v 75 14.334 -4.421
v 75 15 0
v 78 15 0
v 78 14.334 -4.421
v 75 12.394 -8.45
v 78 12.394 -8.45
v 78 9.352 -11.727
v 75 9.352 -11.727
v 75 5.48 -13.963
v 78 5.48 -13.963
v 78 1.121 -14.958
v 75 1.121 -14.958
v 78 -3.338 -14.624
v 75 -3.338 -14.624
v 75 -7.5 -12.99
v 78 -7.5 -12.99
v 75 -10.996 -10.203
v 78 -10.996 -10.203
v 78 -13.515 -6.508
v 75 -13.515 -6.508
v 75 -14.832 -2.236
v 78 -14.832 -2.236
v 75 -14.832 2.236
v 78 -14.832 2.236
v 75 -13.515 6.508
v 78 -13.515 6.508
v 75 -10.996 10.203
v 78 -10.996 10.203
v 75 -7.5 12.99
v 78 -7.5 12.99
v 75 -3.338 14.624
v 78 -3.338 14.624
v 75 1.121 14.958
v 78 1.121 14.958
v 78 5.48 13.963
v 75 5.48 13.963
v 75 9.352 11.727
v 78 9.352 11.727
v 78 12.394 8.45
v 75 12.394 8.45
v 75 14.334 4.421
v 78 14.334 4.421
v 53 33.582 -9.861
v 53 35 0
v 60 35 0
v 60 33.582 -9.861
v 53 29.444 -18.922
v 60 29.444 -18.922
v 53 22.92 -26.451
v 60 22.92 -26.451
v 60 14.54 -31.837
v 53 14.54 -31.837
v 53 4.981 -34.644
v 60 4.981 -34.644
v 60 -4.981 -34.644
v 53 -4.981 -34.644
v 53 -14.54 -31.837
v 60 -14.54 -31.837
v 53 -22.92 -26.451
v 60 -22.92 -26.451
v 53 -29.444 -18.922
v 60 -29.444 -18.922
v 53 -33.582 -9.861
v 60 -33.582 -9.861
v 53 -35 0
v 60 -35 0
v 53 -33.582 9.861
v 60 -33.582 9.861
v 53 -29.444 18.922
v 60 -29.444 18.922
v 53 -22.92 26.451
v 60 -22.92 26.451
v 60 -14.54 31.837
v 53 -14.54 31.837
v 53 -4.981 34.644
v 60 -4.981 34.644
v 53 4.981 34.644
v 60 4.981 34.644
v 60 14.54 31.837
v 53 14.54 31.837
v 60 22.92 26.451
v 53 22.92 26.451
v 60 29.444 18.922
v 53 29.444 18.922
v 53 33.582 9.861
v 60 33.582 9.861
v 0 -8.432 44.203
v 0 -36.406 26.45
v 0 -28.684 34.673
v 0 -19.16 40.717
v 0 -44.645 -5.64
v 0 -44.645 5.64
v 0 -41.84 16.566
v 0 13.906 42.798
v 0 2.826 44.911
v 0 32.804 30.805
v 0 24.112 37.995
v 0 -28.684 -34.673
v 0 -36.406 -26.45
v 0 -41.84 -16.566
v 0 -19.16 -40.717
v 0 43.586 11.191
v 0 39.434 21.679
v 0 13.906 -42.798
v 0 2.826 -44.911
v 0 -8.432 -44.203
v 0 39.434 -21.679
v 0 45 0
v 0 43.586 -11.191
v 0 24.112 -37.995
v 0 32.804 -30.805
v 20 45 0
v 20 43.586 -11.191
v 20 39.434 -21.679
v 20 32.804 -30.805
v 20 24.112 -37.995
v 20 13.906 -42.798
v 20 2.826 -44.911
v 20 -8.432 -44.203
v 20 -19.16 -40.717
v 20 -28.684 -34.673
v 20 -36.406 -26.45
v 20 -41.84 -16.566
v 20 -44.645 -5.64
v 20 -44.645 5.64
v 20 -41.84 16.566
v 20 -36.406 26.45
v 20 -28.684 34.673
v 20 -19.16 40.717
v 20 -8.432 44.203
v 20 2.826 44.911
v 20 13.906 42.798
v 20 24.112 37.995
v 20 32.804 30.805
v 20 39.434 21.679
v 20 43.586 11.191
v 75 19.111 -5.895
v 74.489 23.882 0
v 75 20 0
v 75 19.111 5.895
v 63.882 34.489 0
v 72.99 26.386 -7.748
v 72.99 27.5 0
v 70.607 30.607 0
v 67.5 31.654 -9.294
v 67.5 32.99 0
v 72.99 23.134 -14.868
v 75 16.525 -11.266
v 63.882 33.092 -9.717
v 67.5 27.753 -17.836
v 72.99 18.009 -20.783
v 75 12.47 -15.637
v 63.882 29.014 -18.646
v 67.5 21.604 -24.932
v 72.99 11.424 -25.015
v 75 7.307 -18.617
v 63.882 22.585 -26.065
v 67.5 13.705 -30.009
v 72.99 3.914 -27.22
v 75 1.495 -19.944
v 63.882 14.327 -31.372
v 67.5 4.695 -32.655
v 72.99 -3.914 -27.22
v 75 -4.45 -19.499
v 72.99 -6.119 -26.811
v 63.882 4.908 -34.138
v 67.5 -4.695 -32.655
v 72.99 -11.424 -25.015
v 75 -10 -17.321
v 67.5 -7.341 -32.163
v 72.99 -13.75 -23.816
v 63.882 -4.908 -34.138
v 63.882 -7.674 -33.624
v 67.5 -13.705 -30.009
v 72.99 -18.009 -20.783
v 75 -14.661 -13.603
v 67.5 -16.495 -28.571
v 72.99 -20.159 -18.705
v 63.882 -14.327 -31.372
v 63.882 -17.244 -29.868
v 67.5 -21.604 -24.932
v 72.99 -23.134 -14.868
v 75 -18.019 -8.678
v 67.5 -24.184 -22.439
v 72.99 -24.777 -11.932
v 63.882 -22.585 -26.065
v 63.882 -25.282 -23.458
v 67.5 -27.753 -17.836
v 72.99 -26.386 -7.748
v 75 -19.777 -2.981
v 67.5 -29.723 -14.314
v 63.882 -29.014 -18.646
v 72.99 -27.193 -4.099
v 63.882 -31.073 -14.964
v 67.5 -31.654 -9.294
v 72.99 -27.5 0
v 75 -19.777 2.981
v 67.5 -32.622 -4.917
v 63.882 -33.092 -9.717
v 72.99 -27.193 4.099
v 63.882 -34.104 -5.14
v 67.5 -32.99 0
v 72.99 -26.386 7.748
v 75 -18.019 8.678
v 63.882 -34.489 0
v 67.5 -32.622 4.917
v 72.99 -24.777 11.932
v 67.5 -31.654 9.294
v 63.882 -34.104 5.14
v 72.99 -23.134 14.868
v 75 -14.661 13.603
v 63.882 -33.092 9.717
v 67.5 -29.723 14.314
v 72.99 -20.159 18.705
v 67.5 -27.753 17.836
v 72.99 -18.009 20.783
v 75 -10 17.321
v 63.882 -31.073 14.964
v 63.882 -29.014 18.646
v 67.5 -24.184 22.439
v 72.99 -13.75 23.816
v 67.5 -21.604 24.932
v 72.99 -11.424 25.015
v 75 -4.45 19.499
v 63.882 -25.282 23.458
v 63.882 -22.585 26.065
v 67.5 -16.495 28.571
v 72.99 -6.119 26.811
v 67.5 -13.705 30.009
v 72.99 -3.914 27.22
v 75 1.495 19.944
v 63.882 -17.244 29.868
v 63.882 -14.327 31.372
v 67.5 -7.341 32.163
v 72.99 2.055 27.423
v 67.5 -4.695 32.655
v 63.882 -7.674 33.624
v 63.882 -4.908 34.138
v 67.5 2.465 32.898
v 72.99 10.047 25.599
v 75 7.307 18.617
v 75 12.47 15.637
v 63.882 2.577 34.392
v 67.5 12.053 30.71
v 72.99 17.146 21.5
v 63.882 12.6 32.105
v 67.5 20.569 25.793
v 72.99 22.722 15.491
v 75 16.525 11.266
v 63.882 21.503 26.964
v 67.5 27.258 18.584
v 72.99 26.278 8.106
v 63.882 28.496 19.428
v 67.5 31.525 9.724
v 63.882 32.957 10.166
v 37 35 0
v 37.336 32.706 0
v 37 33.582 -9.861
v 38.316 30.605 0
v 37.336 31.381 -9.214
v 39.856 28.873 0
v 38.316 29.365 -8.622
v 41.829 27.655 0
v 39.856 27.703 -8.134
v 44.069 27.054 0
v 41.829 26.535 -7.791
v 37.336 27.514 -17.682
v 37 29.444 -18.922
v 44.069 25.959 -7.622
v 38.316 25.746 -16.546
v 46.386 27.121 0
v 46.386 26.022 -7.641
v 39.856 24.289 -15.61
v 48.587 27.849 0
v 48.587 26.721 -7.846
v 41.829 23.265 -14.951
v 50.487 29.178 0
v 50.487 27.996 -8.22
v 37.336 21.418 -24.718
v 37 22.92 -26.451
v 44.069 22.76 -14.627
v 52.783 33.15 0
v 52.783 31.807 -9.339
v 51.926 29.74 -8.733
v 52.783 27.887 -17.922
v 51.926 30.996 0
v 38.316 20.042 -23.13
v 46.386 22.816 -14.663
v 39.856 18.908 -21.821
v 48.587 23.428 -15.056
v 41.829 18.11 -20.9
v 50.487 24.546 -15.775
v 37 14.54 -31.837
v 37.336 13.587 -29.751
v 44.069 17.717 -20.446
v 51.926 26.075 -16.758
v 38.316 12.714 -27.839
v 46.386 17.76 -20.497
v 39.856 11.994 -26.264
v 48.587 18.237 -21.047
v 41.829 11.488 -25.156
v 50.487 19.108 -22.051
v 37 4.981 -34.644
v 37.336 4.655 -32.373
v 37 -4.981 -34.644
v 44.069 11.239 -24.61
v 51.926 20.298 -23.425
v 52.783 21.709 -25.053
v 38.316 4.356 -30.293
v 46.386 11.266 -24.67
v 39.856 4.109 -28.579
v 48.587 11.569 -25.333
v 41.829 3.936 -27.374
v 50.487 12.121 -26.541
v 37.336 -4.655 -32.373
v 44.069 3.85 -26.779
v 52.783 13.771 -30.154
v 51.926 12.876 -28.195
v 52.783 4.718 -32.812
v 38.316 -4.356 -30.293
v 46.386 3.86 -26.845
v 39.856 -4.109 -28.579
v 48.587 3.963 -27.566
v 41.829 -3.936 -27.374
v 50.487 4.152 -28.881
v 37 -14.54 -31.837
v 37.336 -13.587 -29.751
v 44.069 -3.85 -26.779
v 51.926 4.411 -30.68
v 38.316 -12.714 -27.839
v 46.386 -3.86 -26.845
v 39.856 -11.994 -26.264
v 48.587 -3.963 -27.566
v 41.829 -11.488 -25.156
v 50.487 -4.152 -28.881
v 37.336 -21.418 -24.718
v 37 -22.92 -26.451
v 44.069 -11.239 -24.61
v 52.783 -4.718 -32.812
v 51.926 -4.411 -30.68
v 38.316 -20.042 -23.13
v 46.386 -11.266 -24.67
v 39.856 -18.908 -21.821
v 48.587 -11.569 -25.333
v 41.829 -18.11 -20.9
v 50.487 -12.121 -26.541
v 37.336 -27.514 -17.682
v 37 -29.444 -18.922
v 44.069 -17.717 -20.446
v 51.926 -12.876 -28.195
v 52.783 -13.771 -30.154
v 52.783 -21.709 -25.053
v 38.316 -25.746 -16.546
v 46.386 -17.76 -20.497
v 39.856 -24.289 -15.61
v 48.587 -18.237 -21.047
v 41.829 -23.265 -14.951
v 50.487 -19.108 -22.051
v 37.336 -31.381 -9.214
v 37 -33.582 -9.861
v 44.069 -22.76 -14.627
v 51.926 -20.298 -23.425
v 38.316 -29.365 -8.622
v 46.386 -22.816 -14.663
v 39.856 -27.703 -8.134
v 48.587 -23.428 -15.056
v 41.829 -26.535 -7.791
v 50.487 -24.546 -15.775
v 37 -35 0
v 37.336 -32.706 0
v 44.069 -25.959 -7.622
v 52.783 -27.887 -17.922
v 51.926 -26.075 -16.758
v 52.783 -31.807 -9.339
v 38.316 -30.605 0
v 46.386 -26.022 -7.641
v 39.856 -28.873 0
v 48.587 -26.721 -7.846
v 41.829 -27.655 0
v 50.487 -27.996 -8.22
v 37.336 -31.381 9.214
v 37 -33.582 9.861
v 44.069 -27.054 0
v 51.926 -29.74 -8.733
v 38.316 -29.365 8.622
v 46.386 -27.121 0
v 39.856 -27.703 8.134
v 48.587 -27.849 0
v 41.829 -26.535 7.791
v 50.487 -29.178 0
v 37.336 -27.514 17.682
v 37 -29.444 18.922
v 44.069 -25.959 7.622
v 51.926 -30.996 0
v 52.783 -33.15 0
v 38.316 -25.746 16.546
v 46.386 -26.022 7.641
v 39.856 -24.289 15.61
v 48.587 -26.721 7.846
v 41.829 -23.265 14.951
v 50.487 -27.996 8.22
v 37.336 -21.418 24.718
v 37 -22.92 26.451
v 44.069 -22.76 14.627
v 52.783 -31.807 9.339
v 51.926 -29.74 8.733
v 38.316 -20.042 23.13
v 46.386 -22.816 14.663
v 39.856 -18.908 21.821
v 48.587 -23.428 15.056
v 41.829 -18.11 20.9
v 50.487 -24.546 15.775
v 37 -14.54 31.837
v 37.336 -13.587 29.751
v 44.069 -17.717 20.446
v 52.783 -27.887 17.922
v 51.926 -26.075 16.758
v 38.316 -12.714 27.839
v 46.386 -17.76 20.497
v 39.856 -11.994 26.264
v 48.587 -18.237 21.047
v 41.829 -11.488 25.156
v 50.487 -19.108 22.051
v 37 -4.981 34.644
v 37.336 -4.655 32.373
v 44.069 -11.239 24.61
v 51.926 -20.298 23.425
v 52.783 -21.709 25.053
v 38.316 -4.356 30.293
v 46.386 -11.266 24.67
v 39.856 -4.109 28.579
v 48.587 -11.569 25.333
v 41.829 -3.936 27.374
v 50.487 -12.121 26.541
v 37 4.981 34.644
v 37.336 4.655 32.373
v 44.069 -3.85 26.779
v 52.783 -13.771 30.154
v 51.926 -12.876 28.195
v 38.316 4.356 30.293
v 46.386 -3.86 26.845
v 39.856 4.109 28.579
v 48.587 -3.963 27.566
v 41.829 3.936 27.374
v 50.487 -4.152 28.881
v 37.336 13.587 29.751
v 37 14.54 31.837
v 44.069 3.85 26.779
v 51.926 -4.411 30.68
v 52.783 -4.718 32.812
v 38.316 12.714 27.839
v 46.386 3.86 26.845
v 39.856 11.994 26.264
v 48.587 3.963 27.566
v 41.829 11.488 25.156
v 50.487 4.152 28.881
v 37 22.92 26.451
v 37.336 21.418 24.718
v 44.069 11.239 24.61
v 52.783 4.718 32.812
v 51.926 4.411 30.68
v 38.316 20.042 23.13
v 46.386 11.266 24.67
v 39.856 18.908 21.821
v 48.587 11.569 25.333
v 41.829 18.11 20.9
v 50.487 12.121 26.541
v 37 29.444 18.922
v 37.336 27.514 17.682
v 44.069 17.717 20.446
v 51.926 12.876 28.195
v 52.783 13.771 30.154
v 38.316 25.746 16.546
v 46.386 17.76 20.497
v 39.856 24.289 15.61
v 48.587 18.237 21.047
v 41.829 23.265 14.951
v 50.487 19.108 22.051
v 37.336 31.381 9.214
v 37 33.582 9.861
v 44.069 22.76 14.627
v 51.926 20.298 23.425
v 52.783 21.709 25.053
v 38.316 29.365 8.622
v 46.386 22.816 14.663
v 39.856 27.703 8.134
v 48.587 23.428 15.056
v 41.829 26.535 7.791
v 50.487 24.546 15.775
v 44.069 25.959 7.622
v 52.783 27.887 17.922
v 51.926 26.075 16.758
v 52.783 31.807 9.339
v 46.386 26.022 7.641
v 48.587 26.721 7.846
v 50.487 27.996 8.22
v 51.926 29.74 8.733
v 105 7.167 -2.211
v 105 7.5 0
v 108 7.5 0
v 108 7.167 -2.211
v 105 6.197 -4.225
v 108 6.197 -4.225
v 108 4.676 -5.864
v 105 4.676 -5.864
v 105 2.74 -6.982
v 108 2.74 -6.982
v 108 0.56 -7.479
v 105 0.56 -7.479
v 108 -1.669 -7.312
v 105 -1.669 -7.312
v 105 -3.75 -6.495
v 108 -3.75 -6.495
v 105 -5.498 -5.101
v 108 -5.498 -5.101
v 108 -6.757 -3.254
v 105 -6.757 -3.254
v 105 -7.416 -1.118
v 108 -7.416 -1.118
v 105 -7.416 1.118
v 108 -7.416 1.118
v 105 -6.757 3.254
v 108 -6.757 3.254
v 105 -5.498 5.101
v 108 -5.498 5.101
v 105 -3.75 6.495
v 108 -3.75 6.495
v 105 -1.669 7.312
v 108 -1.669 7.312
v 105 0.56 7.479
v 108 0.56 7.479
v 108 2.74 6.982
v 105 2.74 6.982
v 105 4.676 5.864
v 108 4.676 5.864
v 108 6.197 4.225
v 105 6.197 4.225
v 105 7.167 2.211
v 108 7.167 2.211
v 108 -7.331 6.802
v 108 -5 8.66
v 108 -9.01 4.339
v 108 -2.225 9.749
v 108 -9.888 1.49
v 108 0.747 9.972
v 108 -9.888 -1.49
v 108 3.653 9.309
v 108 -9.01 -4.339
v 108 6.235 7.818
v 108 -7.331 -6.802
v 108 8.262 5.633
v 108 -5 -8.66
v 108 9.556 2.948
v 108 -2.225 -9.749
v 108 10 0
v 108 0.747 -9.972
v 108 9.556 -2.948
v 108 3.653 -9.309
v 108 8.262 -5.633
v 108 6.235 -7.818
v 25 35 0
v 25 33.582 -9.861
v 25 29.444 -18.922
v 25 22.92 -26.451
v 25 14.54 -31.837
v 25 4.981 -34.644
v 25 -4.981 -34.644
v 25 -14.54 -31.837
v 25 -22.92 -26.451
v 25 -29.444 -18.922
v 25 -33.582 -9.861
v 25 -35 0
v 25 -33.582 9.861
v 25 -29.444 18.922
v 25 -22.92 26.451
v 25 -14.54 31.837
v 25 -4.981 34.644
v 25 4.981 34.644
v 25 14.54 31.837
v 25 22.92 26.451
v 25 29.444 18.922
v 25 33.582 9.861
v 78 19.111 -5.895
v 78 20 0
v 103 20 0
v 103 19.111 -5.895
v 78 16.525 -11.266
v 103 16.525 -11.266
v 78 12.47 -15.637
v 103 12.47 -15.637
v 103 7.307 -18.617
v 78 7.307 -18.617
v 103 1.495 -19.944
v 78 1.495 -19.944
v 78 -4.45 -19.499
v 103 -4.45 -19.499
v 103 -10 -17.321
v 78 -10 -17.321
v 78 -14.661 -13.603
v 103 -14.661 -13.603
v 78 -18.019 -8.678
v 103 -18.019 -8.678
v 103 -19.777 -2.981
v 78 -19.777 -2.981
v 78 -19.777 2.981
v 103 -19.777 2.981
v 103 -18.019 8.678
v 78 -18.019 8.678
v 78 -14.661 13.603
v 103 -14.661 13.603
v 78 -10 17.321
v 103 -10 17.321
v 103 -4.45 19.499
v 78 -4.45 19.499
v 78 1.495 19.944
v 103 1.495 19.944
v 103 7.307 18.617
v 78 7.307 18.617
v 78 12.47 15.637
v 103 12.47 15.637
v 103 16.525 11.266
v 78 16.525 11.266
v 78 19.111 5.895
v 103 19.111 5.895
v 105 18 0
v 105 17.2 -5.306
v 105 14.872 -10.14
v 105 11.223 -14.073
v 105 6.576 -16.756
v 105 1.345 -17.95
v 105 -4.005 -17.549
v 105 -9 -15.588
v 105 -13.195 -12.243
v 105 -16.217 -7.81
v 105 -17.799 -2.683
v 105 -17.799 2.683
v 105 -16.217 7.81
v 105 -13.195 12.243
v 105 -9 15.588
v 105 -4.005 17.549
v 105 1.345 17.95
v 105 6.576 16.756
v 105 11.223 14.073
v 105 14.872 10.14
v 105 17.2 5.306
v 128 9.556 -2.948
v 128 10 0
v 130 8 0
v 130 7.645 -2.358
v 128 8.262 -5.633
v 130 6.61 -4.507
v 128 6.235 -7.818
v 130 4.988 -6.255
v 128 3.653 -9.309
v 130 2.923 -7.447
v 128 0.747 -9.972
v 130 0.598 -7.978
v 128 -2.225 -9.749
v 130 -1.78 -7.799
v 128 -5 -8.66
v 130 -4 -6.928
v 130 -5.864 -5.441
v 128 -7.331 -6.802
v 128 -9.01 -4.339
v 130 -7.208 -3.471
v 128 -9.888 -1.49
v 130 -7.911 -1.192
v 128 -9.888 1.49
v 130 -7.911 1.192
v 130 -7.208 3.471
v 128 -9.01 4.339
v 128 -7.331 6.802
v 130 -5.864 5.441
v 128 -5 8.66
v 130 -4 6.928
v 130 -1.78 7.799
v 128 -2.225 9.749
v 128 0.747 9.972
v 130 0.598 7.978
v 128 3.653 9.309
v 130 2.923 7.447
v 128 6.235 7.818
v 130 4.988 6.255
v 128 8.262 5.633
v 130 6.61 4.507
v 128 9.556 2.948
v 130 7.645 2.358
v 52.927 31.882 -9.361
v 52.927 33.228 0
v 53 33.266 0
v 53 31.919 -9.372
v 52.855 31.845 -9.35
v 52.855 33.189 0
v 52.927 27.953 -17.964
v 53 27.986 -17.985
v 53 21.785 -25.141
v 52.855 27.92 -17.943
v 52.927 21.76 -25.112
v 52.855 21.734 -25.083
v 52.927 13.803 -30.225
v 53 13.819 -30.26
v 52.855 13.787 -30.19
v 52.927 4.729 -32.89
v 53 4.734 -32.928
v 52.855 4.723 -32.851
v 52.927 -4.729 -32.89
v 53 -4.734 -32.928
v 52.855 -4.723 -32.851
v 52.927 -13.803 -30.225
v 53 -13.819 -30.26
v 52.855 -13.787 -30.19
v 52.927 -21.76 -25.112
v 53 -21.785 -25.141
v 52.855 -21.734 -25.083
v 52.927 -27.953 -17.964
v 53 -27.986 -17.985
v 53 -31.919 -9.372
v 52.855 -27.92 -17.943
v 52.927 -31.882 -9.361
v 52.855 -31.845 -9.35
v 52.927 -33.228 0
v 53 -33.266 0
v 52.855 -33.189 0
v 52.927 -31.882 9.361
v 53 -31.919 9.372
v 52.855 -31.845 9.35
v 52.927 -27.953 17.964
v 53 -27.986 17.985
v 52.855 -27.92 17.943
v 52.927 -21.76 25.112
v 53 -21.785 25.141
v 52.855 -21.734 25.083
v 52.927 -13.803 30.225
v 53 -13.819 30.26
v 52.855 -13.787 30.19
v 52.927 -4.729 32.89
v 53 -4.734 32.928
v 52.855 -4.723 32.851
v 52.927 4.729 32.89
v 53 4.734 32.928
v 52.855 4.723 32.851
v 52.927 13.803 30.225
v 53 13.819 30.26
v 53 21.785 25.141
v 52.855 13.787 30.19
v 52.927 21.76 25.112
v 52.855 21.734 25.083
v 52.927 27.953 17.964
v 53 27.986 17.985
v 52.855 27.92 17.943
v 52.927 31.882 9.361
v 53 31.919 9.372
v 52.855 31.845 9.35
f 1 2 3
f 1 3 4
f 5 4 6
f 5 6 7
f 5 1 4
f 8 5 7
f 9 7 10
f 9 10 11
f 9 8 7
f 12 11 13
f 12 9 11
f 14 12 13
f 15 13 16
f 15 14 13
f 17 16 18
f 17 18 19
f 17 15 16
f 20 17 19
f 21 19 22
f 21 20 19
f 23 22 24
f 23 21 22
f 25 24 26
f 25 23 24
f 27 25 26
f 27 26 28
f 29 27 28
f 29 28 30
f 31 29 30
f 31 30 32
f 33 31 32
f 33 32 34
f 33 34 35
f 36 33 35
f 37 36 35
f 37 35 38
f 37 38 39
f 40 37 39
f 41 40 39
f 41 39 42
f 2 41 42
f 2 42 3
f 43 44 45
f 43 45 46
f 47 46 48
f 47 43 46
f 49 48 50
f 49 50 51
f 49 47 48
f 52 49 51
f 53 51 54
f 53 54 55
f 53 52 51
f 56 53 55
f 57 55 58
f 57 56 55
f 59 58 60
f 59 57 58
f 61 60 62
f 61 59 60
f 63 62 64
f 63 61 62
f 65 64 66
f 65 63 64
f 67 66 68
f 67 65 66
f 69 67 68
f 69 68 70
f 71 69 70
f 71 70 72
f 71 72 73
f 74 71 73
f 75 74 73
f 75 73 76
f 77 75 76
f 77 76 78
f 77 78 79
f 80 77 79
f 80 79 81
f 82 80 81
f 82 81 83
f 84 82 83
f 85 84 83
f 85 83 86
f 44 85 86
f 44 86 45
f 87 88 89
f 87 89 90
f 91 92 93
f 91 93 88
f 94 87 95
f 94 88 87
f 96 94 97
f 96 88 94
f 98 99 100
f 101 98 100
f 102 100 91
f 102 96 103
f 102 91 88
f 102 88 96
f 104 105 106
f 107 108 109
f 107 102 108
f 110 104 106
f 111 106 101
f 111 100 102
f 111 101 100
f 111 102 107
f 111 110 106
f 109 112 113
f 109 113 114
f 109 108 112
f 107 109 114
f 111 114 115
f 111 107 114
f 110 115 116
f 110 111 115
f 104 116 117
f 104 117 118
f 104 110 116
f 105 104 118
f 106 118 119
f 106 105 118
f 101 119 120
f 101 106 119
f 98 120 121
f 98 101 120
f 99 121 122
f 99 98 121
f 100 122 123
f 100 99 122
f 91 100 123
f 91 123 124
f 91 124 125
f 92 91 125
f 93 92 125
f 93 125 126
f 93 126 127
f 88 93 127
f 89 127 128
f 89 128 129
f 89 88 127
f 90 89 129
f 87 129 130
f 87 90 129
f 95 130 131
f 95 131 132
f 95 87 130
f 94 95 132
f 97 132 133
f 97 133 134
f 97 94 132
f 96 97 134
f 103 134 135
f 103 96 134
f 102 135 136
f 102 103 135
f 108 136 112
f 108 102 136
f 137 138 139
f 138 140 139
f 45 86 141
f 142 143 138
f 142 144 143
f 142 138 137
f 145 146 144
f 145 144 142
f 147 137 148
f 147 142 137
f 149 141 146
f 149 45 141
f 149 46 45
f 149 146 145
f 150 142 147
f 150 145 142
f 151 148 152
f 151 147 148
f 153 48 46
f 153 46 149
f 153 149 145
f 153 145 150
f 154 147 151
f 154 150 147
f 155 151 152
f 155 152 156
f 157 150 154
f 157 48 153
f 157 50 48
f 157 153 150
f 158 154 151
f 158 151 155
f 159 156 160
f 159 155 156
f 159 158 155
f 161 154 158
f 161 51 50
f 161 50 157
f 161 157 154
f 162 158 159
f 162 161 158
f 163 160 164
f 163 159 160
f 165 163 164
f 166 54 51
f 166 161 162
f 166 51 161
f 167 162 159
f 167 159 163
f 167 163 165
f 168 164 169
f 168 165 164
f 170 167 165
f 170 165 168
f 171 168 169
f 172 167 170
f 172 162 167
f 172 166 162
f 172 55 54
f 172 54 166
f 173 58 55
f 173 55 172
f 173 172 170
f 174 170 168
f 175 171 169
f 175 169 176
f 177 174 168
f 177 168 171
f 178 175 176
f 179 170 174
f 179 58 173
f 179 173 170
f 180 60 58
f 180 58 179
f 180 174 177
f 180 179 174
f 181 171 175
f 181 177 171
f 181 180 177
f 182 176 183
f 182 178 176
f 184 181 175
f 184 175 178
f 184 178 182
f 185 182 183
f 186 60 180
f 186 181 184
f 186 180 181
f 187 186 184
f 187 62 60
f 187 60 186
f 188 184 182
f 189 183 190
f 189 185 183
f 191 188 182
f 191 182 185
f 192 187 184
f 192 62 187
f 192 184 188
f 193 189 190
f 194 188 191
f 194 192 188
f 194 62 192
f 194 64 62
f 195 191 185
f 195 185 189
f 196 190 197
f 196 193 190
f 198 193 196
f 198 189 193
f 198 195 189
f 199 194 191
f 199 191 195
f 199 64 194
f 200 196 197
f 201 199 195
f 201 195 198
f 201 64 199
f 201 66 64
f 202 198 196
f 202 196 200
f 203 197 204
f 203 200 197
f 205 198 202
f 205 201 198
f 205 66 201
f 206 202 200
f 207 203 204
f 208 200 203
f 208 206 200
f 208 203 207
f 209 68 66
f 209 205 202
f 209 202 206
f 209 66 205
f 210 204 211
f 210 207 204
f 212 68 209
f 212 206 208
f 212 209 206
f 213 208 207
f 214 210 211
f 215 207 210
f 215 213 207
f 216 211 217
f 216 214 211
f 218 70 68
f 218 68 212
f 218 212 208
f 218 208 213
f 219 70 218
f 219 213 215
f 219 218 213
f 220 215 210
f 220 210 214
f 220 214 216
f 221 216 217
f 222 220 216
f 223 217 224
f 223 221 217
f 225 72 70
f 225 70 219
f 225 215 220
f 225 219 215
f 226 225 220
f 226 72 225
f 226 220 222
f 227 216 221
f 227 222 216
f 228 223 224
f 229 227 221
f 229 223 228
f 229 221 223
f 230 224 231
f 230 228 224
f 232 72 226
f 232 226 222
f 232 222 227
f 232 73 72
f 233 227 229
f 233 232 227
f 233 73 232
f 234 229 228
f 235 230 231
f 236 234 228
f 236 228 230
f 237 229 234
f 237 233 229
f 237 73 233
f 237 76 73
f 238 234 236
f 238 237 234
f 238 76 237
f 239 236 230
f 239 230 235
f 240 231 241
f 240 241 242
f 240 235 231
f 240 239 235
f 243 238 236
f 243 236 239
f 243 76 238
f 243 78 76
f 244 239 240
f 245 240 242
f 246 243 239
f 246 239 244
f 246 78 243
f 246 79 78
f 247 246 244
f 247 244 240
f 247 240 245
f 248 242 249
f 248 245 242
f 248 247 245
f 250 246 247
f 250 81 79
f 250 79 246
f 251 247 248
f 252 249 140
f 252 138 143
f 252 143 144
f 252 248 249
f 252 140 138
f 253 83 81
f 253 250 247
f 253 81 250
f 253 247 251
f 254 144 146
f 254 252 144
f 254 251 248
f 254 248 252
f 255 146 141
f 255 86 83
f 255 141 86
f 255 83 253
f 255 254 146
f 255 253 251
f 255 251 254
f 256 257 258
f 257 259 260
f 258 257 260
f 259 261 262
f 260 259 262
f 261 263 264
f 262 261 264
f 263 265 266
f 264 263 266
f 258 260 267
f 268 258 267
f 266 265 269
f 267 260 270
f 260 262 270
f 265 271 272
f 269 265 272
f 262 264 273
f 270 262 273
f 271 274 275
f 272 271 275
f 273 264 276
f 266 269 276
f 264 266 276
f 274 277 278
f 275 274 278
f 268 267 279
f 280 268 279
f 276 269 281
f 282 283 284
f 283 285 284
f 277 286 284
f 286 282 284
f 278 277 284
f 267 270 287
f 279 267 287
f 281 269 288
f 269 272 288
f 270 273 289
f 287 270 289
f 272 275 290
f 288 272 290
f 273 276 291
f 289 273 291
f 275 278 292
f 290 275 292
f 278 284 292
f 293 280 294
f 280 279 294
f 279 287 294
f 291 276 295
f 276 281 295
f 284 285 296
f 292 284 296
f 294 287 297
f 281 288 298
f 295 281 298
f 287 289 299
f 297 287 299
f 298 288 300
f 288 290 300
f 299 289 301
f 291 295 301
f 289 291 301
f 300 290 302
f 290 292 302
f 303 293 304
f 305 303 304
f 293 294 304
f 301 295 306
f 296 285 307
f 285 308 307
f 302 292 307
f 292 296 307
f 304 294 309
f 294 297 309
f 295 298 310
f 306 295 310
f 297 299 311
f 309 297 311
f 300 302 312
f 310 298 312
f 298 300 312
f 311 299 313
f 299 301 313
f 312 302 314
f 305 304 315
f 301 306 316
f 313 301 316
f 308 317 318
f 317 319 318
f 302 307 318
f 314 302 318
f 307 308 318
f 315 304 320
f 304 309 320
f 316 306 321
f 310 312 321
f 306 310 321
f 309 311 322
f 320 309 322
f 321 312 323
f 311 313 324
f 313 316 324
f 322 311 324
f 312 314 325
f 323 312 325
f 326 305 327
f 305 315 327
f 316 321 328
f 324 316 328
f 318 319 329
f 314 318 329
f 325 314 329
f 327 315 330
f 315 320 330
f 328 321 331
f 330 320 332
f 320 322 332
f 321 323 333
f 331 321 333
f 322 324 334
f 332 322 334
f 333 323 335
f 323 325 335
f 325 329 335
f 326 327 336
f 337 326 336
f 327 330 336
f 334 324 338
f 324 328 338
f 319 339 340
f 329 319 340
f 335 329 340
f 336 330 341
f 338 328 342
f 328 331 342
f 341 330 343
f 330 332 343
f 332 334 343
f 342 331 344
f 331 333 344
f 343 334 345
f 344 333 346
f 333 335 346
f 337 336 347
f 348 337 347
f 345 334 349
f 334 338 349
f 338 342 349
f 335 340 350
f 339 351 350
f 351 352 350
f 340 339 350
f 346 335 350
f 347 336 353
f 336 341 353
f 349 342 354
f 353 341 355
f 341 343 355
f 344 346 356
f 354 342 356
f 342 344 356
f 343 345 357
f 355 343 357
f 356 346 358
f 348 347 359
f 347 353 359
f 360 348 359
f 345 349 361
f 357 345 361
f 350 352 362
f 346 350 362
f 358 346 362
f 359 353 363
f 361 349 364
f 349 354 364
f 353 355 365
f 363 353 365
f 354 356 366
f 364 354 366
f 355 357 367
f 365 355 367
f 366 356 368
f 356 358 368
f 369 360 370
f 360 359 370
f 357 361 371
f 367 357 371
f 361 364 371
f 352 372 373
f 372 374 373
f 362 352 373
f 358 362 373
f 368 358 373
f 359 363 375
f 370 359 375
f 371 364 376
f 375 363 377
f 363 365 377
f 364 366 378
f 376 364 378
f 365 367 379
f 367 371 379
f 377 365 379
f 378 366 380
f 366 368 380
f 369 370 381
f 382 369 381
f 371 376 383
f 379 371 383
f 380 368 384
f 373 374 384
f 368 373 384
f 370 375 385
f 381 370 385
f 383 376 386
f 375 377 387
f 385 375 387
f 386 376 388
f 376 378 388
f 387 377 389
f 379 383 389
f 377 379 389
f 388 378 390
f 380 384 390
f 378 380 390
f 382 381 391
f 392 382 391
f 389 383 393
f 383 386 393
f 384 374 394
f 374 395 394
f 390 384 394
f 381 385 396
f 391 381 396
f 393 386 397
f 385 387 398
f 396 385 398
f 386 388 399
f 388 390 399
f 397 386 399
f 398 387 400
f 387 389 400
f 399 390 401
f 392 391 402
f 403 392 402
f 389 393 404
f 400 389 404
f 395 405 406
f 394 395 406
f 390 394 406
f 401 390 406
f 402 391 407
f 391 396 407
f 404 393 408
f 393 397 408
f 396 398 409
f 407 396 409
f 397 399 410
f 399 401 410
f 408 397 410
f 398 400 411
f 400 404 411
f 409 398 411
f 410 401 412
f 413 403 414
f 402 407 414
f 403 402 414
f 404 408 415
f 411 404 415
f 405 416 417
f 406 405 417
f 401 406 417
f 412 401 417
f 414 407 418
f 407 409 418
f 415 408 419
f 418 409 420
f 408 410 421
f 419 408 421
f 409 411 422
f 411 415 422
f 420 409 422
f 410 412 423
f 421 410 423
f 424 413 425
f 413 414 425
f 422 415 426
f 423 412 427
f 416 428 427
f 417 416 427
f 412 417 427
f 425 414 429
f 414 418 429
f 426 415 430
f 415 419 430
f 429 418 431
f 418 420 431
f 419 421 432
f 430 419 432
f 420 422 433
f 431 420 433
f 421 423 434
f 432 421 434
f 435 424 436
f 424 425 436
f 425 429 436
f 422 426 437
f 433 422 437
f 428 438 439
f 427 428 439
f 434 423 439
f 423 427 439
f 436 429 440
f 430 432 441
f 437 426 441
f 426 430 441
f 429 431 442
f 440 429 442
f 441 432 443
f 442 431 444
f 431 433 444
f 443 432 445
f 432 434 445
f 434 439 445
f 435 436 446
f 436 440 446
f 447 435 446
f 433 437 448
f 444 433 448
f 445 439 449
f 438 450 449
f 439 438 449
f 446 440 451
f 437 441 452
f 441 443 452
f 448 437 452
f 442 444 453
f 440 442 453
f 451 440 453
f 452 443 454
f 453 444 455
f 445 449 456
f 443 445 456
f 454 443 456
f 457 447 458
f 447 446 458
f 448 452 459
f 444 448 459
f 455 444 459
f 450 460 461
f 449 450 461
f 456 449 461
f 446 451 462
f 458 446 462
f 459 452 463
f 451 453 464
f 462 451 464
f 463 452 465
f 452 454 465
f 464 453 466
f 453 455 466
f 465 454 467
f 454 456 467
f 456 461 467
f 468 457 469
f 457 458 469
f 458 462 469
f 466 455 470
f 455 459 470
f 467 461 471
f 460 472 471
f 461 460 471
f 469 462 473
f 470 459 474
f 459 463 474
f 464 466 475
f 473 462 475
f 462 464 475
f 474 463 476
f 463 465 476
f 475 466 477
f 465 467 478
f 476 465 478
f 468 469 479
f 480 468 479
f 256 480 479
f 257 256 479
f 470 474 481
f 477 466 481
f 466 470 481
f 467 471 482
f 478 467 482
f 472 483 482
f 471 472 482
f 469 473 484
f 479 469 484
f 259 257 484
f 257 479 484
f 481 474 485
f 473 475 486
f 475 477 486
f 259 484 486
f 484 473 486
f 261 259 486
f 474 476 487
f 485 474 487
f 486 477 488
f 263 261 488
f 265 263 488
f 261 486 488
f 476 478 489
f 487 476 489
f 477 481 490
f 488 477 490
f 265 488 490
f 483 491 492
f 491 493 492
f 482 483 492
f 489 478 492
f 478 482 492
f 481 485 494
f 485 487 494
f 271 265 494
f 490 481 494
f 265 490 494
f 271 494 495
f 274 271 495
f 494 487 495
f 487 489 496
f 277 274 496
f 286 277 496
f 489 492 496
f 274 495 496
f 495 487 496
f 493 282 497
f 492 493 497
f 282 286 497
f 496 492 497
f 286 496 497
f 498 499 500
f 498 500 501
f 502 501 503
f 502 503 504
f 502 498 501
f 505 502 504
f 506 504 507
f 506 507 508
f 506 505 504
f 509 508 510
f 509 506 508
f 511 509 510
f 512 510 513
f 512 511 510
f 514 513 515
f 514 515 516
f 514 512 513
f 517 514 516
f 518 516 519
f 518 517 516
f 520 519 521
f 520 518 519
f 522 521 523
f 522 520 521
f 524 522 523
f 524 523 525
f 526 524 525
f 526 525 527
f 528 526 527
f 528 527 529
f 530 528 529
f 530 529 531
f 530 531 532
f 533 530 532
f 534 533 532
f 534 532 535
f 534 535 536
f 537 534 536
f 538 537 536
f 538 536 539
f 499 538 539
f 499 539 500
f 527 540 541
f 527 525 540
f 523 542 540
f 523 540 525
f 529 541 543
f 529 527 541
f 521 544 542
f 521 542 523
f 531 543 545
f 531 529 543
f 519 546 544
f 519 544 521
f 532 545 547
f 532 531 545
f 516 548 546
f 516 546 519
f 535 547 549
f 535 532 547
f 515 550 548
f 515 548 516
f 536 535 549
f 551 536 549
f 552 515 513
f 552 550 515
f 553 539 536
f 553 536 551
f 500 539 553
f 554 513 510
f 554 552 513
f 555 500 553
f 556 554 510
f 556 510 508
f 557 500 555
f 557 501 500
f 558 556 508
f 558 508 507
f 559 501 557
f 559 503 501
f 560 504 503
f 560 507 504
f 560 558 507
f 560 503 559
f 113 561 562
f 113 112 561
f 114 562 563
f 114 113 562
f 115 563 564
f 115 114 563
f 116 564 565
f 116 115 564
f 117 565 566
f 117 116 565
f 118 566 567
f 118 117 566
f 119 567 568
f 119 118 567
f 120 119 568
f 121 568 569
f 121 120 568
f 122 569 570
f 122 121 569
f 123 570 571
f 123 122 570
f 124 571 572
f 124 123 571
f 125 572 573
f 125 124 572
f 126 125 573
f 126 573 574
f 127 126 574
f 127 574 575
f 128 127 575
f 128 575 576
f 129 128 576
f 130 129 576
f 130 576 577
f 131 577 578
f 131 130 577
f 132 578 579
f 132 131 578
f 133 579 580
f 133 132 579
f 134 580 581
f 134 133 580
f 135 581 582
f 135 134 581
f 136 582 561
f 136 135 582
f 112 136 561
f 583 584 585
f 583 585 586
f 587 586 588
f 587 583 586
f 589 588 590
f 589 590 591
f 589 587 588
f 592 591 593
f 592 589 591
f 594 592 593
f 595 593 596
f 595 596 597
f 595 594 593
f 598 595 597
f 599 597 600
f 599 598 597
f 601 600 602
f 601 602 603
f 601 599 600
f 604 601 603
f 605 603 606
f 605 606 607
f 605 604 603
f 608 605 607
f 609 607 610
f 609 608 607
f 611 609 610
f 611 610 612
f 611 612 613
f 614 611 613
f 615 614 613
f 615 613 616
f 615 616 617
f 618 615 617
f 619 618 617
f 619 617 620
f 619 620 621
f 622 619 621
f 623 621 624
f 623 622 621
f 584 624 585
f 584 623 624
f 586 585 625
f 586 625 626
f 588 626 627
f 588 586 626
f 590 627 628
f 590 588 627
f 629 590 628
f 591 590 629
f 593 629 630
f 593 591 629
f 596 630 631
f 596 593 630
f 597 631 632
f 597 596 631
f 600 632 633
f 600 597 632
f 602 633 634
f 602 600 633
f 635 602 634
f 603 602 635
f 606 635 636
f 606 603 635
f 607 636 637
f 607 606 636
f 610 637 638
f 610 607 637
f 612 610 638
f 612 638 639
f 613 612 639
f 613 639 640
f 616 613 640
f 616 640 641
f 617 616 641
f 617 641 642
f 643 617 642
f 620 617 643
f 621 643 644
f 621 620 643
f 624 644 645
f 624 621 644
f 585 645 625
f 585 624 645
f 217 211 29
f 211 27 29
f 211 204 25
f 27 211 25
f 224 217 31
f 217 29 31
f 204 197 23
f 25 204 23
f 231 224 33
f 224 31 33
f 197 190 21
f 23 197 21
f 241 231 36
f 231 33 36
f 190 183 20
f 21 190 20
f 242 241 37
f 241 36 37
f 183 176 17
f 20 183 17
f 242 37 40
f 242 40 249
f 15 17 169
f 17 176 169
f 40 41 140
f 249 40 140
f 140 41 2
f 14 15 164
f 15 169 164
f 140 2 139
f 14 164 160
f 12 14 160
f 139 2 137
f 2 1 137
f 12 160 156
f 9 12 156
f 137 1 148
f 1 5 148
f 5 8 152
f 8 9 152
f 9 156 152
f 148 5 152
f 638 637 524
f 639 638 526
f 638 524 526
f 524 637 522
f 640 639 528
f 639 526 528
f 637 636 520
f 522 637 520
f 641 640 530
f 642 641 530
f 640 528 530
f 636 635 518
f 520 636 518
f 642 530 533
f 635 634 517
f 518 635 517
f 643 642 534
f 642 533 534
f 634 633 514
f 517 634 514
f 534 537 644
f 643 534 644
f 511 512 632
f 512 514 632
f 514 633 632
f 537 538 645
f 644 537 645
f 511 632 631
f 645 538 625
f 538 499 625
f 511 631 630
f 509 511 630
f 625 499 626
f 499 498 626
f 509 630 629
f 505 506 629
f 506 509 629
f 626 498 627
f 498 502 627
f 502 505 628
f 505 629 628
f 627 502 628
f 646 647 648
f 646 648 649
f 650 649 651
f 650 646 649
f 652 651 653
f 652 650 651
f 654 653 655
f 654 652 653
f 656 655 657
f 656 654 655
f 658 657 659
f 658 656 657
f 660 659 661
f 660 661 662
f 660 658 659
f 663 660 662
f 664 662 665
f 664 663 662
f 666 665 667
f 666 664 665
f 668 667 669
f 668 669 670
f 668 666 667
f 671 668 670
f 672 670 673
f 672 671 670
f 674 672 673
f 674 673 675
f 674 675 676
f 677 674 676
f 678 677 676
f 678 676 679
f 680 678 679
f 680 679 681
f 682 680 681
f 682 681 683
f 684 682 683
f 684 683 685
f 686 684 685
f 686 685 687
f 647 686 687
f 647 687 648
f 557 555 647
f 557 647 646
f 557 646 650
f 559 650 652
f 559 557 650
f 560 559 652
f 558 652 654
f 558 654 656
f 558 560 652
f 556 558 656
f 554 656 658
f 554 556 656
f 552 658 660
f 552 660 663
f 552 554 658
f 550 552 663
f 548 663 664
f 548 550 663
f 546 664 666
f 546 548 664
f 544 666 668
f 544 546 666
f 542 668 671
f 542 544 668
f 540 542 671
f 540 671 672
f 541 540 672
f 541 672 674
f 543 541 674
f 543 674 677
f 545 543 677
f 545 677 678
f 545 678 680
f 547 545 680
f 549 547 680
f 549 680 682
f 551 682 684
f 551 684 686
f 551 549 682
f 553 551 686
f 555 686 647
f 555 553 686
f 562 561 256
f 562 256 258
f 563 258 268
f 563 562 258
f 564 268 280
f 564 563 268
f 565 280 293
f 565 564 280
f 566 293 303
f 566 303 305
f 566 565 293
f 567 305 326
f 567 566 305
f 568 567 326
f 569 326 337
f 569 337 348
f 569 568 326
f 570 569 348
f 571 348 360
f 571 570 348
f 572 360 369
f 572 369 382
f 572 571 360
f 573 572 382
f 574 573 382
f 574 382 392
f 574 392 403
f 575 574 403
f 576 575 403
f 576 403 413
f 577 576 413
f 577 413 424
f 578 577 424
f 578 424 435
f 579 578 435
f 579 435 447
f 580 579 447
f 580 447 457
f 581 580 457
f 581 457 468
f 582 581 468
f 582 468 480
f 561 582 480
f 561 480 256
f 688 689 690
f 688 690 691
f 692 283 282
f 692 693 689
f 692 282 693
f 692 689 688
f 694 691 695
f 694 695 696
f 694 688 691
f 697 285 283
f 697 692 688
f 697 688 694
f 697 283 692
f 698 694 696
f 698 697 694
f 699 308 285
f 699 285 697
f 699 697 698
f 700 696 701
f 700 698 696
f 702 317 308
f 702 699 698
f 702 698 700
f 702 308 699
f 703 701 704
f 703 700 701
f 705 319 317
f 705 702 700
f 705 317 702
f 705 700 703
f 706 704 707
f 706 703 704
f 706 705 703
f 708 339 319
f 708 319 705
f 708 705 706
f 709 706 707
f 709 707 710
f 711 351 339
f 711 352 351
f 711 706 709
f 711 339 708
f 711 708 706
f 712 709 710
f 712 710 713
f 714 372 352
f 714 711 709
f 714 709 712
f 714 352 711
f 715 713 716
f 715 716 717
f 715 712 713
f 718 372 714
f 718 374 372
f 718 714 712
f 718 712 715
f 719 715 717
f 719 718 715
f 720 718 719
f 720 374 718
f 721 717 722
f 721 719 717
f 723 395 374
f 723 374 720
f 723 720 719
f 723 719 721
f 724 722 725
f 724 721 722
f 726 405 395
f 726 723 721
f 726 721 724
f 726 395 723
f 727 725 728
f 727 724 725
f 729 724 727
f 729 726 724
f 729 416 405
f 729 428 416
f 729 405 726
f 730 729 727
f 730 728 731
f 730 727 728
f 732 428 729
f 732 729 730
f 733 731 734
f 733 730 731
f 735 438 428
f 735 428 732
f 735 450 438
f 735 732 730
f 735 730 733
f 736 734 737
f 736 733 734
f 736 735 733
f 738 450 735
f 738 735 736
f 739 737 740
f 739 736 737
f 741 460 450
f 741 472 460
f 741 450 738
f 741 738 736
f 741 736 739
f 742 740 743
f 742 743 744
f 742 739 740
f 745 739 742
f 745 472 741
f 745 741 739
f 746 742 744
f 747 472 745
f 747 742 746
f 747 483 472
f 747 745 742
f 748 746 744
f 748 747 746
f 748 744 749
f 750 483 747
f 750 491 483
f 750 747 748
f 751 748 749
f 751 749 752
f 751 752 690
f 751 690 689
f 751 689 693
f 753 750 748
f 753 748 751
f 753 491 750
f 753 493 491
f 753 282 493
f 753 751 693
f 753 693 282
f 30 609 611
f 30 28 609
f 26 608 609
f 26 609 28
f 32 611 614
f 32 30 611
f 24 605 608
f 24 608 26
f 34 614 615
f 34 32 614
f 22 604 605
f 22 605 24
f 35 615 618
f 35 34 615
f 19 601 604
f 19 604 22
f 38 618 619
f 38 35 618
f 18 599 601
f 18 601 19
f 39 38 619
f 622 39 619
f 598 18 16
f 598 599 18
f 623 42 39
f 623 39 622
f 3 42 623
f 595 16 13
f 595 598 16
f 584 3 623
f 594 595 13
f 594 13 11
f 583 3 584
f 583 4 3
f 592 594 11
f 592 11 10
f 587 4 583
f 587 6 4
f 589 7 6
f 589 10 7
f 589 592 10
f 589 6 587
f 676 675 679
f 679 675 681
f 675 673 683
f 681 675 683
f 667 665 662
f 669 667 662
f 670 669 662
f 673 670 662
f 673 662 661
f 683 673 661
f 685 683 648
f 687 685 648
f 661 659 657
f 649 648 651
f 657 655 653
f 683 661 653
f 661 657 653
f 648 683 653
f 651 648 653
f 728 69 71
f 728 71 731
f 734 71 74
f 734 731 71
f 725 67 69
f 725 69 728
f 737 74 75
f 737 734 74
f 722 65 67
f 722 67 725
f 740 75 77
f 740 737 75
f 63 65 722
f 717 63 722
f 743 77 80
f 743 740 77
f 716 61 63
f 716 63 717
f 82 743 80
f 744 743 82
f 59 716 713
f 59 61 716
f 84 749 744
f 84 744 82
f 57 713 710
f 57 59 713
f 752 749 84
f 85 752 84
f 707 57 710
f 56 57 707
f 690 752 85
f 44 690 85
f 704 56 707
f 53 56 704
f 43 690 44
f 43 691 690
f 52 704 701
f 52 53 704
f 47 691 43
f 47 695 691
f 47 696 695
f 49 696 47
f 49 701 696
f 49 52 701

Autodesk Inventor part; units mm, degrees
ref_plane "YZ Plane" through (0, 0, 0) normal (1, 0, 0) x (0, 1, 0)
ref_plane "XZ Plane" through (0, 0, 0) normal (0, 1, 0) x (-1, 0, 0)
ref_plane "XY Plane" through (0, 0, 0) normal (0, 0, 1) x (1, 0, 0)
sketch "Sketch1" plane through (0, 0, 0) normal (0, 0, 1) x (1, 0, 0)
  line L0 (0, 0) -> (20, 0)
  line L1 (20, 35) -> (20, 45)
  line L2 (20, 45) -> (0, 45)
  line L3 (0, 45) -> (0, 0)
  line L4 (20, 0) -> (25, 0)
  line L5 (25, 0) -> (25, 35)
  line L6 (20, 35) -> (20, 0)
  line L7 (25, 0) -> (37, 0)
  line L8 (37, 0) -> (37, 35)
  line L9 (37, 35) -> (25, 35)
  line L10 (25, 35) -> (25, 0)
  line L11 (20, 45) -> (25, 35)
  line L12 (37, 0) -> (53, 0)
  line L13 (53, 0) -> (53, 35)
  line L14 (37, 35) -> (37, 0)
  arc A0 (37, 35) -> (53, 35) centre (45, 35) ccw
  line L15 (53, 0) -> (75, 0)
  line L16 (75, 0) -> (75, 20)
  line L17 (60, 35) -> (53, 35)
  line L18 (53, 35) -> (53, 0)
  arc A1 (75, 20) -> (60, 35) centre (60, 20) ccw
  arc A2 (53, 33.2665) -> (52.7831, 33.1498) centre (60, 20) ccw
  line L19 (75, 0) -> (78, 0)
  line L20 (78, 0) -> (78, 15)
  line L21 (78, 15) -> (75, 15)
  line L22 (75, 15) -> (75, 0)
  line L23 (78, 0) -> (105, 0)
  line L24 (105, 0) -> (105, 20)
  line L25 (105, 20) -> (78, 20)
  line L26 (78, 20) -> (78, 0)
  line L27 (105, 0) -> (108, 0)
  line L28 (108, 0) -> (108, 7.5)
  line L29 (108, 7.5) -> (105, 7.5)
  line L30 (105, 7.5) -> (105, 0)
  line L31 (108, 0) -> (130, 0)
  line L32 (130, 0) -> (130, 10)
  line L33 (130, 10) -> (108, 10)
  line L34 (108, 10) -> (108, 0)
  line L35 (164.0679, 0) -> (-30.9325, 0)
  line L36 (-30.9325, 35) -> (60, 35)
  line L37 (75, 35) -> (164.0679, 35)
  line L38 (60, 35) -> (75, 35)
  point P0 (53, 33.2665)
  dimension "d0" = 20
  dimension "d4" = 12
  dimension "d5" = 35
  dimension "d7" = 16
  dimension "d9" = 22
  dimension "d12" = 3
  dimension "d13" = 15
  dimension "d14" = 27
  dimension "d15" = 20
  dimension "d16" = 3
  dimension "d17" = 7.5
  dimension "d18" = 22
  dimension "d19" = 10
  dimension "d20" = 45
  dimension "d21" = 5
  dimension "d22" = 15
  dimension "d23" = 7
revolve "Revolution1" add sketch "Sketch1" angle 360 about axis through (164.0679, 0, 0) along (-1, 0, 0) contours L3 L36 L6 L0 | L6 L36 L5 L4 | L3 L2 L1 L36 | L5 L9 L8 L7 | L1 L11 L36 | L8 A0 A2 L13 L12 | L13 L17 A1 L16 L15 | L16 L21 L20 L19 | L20 L26 L25 L24 L23 | L24 L29 L28 L27 | L28 L34 L33 L32 L31
chamfer "Chamfer1" distance 2 angle 45 1 edges at (105, -20, 0)
chamfer "Chamfer2" distance 2 angle 45 1 edges at (130, -10, 0)
thread "Thread1" size "M40x3" class "6g" standard "ANSI Metric M Profile" full length
thread "Thread2" size "M20x1" class "6g" standard "ANSI Metric M Profile" full length
properties part number "Tarefa 2" material "Bronze, Cast"
